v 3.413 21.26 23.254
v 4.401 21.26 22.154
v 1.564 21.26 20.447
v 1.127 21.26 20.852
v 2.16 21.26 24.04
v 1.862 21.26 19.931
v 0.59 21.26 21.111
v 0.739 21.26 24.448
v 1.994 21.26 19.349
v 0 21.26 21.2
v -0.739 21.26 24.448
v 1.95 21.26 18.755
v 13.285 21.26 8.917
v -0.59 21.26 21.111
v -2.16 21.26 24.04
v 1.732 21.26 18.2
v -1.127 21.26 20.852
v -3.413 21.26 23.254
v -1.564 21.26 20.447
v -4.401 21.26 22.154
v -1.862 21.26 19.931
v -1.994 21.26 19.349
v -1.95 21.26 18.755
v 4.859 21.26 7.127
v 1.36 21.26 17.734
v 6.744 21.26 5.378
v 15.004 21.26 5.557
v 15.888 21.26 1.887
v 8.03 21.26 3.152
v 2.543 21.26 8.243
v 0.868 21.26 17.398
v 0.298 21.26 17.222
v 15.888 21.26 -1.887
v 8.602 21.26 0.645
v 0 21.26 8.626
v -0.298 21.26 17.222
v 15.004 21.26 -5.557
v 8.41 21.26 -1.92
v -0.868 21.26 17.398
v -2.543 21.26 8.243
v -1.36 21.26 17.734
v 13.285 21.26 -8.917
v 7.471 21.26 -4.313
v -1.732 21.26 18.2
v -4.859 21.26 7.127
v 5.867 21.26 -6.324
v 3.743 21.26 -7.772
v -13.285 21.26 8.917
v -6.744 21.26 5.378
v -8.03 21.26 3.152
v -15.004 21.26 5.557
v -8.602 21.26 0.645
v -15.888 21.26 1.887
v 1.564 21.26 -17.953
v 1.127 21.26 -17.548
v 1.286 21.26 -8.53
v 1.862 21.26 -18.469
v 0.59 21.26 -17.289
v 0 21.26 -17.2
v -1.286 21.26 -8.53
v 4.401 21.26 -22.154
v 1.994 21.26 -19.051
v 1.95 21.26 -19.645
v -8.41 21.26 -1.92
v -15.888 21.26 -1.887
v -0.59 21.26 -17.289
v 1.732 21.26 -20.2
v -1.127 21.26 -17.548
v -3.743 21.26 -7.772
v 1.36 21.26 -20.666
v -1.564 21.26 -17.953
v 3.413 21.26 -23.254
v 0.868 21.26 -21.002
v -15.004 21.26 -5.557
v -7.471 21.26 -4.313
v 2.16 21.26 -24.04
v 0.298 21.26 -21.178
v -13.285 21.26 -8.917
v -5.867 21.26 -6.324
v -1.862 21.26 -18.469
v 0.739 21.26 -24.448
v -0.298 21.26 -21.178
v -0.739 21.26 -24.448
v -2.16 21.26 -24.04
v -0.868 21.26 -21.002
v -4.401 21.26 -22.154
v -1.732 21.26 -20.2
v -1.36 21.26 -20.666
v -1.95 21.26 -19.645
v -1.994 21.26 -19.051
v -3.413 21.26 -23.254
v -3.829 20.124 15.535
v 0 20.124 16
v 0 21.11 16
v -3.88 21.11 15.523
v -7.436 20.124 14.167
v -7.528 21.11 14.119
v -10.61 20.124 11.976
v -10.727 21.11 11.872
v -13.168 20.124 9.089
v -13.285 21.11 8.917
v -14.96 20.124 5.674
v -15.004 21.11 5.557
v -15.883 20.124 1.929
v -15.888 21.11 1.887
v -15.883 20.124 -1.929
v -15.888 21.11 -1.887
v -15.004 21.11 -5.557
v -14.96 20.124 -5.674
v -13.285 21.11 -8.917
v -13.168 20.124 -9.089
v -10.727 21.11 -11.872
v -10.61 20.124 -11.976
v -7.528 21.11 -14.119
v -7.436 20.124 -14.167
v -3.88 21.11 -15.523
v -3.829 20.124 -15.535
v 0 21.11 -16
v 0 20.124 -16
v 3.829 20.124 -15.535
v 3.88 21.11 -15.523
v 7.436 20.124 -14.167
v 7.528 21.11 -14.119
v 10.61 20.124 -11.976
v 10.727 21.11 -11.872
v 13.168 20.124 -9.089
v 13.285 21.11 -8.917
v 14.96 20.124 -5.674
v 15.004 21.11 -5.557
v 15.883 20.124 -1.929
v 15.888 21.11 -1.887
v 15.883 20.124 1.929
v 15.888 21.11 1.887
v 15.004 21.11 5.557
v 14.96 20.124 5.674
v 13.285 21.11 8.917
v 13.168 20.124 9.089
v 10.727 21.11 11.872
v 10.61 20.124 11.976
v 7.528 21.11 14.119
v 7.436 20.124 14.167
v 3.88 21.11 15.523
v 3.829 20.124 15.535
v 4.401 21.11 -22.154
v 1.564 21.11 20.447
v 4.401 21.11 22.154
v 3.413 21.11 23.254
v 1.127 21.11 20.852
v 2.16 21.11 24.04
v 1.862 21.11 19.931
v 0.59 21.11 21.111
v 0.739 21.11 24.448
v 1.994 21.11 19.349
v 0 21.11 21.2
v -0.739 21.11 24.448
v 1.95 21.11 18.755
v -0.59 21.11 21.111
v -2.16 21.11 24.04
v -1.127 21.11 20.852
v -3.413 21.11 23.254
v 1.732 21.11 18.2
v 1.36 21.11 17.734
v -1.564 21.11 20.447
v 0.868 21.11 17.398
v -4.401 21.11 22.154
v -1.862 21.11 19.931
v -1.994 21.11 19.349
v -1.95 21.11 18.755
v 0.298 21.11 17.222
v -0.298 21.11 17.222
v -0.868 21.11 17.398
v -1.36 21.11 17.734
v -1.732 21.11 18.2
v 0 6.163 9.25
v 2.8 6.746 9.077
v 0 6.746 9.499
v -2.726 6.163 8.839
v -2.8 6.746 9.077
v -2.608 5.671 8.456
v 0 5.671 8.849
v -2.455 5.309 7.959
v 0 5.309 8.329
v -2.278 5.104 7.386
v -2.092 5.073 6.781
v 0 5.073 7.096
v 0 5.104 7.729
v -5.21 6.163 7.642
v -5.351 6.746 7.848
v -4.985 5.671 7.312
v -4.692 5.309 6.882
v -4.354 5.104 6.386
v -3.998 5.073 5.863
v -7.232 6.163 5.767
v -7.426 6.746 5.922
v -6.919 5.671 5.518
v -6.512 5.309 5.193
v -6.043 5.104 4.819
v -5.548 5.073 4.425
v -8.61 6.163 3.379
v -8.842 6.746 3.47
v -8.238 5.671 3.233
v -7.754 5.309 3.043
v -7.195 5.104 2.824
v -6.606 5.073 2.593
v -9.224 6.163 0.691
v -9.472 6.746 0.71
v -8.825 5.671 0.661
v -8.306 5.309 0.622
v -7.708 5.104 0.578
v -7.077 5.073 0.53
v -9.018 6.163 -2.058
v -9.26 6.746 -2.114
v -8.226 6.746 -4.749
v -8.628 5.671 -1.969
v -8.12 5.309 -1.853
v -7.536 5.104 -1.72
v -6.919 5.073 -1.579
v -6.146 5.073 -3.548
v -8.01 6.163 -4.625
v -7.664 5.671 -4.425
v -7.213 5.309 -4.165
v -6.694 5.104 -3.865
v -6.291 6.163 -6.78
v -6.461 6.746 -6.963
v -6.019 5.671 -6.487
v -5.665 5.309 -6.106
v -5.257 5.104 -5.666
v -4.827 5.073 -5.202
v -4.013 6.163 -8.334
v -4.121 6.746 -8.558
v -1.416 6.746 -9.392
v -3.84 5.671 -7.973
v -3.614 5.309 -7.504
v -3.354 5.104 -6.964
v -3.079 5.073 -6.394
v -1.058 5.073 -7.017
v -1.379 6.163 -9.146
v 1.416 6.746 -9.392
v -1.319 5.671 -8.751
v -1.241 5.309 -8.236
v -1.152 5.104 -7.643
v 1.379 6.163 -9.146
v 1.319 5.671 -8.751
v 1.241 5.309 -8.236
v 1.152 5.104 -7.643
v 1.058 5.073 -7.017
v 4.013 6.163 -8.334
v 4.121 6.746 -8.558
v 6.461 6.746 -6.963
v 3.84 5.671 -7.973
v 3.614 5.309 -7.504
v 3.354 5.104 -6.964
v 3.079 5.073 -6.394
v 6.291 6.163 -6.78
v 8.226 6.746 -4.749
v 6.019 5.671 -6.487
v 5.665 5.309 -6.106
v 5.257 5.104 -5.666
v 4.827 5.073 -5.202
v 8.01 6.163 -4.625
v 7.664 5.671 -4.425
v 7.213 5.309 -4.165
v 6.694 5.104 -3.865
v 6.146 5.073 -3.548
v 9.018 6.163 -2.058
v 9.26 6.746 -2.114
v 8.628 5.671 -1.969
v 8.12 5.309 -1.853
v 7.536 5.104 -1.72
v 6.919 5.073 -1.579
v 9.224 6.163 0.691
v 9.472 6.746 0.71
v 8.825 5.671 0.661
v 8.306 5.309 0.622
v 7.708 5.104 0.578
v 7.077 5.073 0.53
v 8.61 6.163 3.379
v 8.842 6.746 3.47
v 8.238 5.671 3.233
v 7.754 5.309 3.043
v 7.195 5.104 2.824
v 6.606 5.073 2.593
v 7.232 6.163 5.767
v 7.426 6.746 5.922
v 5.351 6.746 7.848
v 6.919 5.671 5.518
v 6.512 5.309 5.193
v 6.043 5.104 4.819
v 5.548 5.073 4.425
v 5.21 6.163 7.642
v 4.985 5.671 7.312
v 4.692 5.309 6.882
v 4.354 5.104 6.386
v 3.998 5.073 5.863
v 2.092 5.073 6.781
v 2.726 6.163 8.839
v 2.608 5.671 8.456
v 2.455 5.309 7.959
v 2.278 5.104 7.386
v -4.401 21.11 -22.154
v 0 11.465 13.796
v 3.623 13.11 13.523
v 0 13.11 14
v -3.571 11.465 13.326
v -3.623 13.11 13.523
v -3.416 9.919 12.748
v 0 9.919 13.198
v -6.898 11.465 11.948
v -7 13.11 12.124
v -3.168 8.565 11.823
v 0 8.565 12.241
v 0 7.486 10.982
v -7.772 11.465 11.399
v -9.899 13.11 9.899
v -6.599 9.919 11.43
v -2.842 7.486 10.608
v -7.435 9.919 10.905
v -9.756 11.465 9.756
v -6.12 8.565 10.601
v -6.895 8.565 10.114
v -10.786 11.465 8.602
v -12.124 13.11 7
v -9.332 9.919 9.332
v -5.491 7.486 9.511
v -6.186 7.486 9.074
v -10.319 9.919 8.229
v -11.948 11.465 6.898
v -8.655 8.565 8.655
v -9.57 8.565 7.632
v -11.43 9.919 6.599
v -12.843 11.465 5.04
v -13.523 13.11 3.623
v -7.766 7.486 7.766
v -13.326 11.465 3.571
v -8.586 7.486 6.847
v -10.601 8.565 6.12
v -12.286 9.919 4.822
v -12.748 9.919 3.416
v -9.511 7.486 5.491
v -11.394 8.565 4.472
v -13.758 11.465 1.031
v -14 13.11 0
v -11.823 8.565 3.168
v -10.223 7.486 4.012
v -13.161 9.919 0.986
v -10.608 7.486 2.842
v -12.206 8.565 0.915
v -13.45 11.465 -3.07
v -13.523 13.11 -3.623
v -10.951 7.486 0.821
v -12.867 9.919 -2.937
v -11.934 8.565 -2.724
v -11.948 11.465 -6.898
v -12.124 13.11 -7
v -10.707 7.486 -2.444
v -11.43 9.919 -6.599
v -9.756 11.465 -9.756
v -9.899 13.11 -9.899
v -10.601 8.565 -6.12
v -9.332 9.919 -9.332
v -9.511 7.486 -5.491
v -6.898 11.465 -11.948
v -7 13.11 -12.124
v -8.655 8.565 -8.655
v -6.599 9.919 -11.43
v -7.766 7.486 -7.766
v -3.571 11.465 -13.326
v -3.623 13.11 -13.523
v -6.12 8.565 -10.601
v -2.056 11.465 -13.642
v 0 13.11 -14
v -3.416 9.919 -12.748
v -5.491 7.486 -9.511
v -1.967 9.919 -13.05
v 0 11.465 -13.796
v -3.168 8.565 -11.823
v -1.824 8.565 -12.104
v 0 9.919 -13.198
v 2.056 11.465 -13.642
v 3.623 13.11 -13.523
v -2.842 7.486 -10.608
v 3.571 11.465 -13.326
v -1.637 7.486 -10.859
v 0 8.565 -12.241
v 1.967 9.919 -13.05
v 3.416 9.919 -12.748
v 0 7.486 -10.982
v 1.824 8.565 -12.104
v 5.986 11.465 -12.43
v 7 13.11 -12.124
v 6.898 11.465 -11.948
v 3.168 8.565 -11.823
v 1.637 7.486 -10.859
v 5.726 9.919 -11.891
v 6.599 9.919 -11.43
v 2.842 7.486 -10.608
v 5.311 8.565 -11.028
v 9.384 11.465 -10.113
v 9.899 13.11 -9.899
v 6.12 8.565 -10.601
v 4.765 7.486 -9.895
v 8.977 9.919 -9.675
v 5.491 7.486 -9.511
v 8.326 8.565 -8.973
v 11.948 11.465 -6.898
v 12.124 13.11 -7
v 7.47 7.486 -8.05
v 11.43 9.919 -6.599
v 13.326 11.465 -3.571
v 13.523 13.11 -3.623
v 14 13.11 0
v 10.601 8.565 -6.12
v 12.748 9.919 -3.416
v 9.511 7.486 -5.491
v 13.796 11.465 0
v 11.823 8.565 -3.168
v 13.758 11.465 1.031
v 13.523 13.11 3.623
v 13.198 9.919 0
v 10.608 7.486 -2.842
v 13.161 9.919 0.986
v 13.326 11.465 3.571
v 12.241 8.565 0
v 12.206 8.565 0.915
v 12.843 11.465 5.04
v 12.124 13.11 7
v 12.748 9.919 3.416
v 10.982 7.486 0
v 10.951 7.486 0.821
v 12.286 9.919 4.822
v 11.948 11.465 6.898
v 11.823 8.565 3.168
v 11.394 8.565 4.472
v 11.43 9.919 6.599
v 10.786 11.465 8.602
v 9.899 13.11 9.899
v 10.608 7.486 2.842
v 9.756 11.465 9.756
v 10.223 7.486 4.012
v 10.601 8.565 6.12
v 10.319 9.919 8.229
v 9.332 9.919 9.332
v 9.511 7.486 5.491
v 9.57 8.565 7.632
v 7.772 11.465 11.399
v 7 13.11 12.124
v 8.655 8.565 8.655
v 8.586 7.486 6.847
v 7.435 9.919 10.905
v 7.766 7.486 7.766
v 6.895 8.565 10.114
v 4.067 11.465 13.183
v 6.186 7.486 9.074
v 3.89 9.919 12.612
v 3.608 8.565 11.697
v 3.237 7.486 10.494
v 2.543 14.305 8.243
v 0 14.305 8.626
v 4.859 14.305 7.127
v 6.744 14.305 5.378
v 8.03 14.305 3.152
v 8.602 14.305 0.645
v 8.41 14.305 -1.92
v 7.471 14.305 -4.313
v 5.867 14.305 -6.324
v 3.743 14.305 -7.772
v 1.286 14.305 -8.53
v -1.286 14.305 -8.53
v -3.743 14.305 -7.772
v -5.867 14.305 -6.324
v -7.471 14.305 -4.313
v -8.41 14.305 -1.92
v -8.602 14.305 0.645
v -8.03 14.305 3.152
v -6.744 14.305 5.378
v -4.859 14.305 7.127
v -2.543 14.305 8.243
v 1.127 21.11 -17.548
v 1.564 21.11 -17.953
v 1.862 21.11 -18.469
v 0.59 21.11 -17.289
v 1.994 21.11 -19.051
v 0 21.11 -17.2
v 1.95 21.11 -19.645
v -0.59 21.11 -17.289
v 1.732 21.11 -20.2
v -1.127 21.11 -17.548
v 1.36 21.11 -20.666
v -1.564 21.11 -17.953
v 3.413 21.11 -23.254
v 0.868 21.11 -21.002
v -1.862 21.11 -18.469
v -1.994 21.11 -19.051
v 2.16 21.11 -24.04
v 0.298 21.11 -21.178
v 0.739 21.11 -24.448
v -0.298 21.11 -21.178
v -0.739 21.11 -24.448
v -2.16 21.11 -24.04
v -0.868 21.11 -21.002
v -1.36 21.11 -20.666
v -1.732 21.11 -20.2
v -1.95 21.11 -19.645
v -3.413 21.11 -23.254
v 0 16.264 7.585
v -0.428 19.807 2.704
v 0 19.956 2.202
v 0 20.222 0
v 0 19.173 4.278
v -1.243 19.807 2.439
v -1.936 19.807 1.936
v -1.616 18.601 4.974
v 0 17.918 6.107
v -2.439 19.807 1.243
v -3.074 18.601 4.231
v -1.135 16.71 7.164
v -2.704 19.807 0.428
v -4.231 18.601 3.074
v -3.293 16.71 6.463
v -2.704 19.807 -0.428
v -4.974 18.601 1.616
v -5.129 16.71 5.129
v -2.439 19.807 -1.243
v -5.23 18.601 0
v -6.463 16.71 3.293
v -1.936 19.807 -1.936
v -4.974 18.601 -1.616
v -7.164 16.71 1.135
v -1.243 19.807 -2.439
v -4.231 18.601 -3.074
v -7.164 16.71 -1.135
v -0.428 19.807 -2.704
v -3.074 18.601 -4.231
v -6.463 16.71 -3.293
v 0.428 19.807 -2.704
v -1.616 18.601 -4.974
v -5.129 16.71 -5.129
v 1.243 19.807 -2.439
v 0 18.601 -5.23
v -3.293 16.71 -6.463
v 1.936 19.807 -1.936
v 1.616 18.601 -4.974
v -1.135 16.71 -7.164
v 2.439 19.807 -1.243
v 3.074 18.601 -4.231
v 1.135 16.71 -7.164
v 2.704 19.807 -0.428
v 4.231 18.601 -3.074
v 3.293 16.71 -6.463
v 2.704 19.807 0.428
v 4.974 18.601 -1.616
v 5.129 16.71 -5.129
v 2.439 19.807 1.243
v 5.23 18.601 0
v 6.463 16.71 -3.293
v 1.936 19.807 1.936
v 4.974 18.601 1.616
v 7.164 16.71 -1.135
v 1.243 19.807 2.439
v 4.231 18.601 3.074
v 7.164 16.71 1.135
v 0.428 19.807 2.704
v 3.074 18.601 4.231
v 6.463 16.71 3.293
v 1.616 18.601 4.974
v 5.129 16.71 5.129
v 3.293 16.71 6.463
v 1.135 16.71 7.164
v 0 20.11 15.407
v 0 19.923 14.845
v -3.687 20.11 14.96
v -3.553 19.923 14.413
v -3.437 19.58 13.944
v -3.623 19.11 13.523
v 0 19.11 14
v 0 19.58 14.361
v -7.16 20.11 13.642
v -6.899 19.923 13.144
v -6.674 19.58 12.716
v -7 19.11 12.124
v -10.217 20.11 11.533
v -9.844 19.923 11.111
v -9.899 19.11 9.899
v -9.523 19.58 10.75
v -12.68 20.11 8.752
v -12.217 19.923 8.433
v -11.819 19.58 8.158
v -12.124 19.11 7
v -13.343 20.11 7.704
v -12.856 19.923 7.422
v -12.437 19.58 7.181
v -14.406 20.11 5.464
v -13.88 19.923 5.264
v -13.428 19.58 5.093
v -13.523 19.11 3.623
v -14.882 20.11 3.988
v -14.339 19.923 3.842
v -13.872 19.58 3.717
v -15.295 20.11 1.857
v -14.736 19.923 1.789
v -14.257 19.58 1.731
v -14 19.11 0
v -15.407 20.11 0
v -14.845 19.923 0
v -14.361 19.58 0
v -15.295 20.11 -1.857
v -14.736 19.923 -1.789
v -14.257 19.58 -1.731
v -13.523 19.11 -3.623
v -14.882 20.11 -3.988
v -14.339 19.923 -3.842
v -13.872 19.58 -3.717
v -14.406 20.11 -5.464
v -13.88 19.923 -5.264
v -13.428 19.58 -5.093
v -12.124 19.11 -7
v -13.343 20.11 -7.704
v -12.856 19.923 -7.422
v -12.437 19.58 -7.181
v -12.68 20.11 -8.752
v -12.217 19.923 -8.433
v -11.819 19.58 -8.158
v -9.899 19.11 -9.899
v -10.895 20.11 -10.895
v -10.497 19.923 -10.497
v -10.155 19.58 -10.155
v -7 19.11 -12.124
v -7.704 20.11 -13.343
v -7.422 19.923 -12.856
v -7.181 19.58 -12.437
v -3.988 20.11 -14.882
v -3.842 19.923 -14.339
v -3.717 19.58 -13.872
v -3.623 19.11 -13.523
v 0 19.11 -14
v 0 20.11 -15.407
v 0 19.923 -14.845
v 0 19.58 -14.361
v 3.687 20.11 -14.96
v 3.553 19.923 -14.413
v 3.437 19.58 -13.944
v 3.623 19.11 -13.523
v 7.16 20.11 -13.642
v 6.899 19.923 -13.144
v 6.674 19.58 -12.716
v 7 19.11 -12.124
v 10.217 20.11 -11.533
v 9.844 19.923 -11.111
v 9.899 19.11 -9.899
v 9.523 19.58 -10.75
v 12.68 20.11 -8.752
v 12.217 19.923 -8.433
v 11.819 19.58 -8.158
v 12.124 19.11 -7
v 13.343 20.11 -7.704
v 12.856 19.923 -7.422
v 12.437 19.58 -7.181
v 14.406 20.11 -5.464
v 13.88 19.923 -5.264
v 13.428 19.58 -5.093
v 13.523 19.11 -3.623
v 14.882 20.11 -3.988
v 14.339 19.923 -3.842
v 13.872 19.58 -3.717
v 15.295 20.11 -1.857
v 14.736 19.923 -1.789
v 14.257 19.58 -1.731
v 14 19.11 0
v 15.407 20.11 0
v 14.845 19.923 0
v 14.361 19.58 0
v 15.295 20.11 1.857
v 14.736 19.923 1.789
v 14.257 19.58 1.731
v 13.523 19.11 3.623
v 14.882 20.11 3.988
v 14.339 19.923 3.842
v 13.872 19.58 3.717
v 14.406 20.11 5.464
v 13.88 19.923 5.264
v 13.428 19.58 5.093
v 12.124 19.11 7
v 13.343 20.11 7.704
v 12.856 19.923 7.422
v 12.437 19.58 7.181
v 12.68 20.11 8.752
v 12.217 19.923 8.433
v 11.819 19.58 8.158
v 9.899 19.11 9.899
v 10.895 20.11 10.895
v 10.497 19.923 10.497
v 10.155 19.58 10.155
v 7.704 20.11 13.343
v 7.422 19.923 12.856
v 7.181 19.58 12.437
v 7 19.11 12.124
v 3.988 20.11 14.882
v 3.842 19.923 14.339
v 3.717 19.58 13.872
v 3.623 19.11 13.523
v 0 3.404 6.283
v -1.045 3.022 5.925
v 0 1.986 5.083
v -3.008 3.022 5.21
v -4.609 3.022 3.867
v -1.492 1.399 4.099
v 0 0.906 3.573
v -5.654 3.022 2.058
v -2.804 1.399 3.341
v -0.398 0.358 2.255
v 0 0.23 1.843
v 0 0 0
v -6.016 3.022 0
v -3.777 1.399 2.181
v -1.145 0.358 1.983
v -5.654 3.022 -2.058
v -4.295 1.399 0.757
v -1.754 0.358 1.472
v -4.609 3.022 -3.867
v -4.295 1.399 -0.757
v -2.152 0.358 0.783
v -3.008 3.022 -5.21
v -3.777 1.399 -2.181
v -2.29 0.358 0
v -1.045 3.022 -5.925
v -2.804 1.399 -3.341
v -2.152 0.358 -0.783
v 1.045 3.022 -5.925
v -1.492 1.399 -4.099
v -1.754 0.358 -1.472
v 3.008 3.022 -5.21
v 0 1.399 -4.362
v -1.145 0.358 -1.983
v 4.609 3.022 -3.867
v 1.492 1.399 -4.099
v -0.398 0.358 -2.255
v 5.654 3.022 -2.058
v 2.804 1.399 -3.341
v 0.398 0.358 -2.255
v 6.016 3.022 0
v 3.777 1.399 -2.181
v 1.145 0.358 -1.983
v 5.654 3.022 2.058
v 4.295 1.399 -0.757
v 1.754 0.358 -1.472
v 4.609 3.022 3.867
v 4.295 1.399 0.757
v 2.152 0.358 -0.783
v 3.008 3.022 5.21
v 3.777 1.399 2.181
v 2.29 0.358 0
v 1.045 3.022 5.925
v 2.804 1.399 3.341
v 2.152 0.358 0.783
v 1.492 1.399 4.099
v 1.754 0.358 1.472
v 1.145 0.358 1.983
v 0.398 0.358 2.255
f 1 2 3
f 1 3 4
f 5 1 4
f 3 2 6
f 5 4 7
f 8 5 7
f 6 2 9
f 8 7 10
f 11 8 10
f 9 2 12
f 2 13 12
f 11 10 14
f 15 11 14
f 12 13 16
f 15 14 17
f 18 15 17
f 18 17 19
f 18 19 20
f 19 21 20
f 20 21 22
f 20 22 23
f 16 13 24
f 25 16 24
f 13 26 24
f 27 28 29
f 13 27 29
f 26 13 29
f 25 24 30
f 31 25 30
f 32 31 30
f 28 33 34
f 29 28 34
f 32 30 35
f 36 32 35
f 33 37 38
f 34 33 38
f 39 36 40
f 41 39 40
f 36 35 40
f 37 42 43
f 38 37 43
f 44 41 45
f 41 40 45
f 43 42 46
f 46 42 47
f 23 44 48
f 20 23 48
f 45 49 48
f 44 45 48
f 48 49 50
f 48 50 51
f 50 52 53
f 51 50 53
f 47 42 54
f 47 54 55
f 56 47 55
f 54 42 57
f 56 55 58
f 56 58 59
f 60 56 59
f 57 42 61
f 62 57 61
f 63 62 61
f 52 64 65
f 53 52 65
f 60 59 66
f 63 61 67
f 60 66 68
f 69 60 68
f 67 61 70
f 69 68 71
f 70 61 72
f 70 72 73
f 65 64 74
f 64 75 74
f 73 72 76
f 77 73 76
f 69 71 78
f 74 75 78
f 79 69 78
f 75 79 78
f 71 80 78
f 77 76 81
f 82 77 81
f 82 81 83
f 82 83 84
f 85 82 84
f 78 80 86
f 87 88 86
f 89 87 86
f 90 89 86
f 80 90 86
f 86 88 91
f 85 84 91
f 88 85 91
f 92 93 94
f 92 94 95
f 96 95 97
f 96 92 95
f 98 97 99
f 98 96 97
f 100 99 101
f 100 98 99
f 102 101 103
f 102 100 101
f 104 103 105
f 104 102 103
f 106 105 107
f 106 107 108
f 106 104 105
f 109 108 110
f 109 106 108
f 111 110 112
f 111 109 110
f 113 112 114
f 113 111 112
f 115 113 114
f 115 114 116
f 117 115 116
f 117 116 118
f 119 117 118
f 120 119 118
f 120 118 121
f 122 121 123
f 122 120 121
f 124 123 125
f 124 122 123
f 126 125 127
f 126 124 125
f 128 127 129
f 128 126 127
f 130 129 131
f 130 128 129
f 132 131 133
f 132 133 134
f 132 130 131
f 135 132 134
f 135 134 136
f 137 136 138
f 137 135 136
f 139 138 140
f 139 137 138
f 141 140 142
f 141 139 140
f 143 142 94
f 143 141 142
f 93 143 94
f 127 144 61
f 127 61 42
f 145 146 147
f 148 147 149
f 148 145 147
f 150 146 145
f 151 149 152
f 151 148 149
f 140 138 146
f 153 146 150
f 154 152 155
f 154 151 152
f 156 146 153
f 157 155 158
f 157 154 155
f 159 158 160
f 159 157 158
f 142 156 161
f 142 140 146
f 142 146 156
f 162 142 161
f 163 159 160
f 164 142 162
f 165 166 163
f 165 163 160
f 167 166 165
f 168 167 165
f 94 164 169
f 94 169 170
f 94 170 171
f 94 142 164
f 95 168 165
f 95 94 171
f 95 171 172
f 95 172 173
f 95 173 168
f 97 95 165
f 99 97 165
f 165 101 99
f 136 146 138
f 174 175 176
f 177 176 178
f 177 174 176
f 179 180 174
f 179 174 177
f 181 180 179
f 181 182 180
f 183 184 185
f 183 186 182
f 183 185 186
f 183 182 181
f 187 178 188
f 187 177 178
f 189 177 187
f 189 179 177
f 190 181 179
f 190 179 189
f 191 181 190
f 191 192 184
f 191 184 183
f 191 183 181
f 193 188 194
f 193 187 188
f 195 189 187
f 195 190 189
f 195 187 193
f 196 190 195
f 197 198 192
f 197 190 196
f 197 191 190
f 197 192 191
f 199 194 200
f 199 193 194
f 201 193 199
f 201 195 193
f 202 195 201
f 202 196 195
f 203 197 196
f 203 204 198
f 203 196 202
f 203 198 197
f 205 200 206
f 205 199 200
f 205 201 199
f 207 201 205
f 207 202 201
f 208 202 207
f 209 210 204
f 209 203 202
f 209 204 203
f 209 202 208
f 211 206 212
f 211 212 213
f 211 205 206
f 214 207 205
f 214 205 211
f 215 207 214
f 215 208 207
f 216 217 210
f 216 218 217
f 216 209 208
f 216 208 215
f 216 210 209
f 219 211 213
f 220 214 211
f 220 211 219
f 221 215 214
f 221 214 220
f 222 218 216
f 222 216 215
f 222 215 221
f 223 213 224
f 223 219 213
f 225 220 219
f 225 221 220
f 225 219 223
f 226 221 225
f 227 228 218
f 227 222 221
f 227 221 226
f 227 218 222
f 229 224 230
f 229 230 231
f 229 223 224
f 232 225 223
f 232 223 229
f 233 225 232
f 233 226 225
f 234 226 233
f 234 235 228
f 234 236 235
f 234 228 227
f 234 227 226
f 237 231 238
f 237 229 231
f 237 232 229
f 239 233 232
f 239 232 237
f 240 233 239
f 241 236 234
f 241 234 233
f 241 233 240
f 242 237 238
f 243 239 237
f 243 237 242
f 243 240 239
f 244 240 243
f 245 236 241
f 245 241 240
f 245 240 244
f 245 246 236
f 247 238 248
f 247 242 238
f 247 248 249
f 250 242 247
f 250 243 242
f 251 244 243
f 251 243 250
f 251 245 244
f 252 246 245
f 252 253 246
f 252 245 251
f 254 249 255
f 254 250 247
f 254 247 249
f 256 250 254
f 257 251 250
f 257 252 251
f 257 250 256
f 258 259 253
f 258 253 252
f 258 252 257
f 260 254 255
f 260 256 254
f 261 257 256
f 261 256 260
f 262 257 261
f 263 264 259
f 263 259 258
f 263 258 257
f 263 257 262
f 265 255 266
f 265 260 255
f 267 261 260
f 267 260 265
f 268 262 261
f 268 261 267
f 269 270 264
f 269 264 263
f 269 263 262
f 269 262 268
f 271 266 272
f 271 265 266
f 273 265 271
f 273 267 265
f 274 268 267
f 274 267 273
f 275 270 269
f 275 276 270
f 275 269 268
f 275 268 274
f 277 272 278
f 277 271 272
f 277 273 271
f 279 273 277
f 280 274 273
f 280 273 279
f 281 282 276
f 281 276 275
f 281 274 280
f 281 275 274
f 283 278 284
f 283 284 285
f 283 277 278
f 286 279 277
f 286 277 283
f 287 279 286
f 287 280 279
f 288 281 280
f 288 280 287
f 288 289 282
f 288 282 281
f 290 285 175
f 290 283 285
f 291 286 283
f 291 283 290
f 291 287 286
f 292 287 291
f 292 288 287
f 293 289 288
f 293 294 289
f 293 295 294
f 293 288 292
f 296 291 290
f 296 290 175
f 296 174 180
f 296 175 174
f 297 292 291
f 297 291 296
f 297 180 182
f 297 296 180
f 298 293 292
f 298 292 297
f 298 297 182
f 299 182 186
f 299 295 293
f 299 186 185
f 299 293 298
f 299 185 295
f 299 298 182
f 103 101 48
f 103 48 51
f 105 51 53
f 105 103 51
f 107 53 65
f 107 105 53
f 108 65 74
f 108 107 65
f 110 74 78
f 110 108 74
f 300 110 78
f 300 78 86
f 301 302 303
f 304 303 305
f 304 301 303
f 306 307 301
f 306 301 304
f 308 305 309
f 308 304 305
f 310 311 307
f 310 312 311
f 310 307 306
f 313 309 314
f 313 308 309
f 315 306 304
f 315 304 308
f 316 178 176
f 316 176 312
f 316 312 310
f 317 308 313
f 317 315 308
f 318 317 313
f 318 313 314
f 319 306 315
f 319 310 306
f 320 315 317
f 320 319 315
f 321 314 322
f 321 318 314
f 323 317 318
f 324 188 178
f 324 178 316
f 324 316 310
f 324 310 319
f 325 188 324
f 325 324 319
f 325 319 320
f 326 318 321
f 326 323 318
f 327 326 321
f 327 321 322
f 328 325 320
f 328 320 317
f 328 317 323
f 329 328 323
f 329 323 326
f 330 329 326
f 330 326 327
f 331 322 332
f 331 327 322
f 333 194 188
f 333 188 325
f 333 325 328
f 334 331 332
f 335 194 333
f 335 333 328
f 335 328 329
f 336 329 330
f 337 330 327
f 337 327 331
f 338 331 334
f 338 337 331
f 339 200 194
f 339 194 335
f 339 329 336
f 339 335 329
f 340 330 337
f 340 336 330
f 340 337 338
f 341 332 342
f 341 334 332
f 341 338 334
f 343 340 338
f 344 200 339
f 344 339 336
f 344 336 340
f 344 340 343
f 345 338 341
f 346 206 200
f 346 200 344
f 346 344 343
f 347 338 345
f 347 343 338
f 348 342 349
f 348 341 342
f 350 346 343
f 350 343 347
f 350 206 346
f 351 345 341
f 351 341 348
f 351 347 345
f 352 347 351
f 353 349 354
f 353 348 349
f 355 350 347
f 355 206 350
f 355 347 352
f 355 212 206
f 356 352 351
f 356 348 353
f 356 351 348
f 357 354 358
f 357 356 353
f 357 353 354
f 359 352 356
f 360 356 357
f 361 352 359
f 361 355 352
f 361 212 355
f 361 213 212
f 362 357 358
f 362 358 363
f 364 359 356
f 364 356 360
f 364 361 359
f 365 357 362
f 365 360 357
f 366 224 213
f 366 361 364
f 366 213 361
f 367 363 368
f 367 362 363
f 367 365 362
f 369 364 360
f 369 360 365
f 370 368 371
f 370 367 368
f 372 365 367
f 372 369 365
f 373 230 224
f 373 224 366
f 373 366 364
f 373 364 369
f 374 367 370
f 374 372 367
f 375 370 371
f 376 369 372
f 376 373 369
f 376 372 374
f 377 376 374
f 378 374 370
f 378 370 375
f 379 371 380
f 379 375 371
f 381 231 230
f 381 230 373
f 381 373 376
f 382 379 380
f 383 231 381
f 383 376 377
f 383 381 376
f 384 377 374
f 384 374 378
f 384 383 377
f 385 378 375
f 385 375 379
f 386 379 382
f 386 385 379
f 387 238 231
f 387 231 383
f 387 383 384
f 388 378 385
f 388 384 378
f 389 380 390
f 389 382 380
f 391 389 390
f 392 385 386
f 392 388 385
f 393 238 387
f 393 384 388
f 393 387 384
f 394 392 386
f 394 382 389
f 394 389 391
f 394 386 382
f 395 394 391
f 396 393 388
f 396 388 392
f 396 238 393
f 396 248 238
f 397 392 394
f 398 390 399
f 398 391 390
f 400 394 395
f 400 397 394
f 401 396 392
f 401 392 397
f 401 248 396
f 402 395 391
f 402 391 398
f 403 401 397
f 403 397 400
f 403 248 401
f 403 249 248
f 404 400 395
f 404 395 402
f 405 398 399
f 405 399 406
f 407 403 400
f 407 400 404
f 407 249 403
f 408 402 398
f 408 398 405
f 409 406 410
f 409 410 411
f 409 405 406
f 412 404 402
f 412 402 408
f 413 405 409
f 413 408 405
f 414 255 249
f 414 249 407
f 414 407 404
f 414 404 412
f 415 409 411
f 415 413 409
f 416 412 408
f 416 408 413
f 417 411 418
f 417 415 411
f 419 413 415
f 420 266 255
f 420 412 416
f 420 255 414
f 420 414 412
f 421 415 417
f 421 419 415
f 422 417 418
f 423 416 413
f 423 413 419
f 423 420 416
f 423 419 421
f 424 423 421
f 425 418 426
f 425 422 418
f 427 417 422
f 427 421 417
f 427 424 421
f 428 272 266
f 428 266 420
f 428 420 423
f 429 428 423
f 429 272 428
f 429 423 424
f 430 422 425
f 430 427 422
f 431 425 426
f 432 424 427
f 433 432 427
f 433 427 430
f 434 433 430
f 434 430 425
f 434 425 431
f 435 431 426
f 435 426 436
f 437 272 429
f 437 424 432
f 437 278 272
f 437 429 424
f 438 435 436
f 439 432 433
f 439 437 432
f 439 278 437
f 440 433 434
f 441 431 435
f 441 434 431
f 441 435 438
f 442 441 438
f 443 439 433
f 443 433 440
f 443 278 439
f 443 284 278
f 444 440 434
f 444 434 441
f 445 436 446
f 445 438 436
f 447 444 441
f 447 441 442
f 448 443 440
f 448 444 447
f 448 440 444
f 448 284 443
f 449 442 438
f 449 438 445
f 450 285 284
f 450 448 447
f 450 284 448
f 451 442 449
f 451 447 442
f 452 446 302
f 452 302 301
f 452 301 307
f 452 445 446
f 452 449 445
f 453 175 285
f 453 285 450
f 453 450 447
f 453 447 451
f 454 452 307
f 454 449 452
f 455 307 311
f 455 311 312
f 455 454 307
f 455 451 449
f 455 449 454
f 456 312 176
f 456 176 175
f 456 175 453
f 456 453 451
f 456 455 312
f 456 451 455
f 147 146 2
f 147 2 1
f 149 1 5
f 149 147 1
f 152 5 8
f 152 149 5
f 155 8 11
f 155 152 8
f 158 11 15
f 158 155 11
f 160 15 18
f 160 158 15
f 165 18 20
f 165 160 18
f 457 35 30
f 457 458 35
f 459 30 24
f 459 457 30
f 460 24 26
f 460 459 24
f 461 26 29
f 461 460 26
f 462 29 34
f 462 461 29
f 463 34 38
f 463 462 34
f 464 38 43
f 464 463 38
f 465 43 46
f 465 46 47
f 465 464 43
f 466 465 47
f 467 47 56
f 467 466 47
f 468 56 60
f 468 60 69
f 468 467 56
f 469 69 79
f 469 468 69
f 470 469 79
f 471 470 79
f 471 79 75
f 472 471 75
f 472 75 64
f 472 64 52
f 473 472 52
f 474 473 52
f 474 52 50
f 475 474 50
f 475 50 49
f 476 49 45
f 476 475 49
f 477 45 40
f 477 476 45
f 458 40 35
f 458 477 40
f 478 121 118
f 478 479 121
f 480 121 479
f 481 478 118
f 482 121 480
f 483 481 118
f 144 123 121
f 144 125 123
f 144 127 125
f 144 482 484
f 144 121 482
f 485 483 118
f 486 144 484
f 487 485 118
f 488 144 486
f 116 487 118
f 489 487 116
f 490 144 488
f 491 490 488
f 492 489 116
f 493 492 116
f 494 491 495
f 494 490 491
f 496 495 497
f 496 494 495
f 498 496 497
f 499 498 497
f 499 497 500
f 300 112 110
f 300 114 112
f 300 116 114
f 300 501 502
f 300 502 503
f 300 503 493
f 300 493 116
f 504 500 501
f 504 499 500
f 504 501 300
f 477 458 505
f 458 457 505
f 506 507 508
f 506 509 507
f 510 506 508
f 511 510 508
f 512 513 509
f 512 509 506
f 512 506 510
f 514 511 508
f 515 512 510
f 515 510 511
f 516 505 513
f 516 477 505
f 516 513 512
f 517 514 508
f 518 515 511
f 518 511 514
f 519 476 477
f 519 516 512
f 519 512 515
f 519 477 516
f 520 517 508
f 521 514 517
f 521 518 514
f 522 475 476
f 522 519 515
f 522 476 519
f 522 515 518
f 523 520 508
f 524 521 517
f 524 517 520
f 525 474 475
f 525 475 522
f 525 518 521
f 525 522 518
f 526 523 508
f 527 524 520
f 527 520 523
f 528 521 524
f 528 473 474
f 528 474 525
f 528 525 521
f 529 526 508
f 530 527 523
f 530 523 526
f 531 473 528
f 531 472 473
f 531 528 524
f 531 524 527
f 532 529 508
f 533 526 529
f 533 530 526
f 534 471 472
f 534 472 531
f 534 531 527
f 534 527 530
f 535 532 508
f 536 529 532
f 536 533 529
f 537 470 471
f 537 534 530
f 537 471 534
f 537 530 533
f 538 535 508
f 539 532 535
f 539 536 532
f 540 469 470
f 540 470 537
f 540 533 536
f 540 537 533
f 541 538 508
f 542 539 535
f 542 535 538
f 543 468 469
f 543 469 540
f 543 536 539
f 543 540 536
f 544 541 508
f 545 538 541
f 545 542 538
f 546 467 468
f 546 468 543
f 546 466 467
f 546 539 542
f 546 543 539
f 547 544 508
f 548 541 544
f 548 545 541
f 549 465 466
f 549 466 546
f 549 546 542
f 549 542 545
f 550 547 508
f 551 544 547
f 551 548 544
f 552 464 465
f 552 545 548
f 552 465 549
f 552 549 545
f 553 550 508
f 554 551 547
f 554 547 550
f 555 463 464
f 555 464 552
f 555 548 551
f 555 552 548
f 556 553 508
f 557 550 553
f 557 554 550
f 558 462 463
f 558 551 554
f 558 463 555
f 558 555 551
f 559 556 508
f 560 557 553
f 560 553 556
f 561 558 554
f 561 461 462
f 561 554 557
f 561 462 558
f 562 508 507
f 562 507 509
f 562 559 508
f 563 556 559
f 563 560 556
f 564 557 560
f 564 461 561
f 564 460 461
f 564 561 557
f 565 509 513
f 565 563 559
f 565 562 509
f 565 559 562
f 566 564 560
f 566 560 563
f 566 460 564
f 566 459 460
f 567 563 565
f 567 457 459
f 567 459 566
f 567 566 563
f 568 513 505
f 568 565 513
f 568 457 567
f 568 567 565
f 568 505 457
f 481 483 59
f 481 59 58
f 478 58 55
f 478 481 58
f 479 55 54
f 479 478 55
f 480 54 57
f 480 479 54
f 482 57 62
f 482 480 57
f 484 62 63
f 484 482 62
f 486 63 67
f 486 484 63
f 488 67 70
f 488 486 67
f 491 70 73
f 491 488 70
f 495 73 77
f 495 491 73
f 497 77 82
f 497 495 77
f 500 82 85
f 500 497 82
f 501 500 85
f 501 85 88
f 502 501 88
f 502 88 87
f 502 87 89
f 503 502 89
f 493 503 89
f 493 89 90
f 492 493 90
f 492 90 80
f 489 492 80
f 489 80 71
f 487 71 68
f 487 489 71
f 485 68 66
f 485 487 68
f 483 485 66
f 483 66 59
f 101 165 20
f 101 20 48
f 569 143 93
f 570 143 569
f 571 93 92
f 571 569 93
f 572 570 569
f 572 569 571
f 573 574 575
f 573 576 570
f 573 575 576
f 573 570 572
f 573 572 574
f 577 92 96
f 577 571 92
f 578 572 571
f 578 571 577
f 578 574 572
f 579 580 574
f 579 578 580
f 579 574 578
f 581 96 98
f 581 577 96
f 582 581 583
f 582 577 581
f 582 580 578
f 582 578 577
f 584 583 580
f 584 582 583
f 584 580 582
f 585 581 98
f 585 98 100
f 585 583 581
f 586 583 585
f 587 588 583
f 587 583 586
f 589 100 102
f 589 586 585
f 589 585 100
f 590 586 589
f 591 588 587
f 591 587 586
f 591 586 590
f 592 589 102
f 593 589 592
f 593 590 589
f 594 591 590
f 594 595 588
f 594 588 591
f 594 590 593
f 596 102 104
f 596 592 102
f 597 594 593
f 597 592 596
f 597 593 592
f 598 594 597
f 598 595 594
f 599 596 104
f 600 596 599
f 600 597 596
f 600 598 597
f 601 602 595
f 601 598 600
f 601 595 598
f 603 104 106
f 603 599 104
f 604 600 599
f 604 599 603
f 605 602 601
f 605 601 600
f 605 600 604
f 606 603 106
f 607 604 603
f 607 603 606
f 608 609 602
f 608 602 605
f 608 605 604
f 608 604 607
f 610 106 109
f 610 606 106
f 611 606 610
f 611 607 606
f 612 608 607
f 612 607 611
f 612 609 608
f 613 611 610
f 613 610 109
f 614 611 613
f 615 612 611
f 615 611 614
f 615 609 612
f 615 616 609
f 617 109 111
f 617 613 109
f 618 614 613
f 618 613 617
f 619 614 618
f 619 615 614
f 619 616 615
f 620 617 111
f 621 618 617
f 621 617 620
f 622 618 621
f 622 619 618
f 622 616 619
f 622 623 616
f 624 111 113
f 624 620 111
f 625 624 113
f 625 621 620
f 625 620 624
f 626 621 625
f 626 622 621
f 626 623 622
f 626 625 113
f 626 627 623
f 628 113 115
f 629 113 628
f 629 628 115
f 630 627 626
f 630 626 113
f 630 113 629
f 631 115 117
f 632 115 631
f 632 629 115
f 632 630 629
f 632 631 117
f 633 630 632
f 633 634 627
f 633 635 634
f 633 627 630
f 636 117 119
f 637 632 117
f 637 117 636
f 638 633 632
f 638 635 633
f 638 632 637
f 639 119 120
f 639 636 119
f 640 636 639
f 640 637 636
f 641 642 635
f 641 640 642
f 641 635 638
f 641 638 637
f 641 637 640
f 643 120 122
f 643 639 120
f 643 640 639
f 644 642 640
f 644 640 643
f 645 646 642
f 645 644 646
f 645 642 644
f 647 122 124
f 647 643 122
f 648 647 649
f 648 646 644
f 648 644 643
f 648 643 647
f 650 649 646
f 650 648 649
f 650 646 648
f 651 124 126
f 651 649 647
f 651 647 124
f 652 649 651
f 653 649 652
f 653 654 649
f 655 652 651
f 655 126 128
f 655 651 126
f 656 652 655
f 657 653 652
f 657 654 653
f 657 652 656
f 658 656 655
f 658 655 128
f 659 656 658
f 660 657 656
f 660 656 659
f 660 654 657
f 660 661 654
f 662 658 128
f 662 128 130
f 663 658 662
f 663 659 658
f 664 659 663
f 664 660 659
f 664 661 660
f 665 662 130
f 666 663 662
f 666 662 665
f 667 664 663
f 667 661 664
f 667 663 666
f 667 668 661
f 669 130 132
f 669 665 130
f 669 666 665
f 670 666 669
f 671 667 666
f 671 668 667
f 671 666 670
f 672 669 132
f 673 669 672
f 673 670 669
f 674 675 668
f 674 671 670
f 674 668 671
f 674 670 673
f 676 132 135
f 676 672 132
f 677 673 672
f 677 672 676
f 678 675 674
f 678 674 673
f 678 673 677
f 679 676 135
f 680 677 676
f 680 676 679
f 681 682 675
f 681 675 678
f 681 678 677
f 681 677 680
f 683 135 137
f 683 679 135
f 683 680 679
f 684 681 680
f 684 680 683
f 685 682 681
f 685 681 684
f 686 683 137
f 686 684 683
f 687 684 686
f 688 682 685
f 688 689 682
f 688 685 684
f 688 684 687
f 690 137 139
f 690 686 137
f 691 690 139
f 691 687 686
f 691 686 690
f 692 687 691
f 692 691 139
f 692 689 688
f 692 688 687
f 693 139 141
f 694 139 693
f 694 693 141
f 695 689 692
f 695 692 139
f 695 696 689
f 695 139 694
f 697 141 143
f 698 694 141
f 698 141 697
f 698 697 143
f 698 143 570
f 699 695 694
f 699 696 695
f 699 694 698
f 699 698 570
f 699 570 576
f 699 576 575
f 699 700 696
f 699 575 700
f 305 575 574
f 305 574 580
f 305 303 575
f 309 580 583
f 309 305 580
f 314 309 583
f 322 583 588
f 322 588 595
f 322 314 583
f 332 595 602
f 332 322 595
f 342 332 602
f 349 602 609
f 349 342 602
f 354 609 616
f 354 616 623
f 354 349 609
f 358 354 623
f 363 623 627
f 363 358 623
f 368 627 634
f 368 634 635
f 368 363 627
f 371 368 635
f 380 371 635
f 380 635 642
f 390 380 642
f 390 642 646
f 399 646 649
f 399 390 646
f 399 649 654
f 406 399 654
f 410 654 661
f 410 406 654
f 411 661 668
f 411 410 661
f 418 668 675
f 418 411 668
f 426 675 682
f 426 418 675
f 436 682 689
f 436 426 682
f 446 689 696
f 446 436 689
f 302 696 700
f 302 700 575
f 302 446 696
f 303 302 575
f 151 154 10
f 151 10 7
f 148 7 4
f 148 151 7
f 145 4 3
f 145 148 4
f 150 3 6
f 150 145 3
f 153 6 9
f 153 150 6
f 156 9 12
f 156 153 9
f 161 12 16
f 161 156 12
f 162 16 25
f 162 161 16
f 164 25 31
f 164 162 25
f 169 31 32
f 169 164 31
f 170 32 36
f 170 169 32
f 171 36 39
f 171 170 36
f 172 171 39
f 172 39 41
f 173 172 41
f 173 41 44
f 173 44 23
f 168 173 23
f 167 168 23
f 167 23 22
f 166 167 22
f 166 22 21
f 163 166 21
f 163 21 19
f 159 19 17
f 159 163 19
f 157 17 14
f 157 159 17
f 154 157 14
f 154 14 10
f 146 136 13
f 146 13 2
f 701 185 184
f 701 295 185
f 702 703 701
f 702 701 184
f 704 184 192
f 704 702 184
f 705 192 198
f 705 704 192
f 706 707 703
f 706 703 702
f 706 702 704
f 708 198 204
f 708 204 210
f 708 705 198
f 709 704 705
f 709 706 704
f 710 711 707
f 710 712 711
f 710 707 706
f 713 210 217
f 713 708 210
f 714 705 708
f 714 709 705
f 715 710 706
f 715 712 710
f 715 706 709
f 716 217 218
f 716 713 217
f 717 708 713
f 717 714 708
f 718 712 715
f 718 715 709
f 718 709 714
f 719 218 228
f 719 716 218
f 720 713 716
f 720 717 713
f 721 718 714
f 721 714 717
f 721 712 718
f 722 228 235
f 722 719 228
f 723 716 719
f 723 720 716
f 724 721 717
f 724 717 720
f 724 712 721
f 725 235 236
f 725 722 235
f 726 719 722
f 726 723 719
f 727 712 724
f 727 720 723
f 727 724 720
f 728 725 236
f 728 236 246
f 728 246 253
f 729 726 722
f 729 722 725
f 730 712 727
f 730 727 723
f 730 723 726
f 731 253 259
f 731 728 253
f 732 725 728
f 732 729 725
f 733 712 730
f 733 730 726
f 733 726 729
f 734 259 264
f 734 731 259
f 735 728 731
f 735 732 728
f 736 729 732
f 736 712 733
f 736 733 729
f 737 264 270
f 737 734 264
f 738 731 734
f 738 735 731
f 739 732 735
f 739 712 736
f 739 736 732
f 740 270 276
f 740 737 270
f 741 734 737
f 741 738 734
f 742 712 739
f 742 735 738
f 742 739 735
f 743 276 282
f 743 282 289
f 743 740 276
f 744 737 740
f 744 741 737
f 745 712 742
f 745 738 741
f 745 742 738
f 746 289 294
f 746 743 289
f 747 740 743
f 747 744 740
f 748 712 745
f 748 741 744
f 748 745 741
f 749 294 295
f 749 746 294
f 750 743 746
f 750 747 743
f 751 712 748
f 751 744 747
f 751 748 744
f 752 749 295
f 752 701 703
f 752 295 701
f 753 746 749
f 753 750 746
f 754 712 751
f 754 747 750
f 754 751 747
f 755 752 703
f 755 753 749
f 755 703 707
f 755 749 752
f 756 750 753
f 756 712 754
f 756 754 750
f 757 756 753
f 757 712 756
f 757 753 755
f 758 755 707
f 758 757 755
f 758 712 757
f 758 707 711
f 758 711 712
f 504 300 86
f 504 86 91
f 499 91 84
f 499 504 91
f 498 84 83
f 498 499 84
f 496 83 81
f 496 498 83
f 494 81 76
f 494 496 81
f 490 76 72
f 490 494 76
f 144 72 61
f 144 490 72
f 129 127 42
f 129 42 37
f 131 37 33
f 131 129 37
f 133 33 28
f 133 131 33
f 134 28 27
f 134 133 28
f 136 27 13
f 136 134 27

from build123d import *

# Parameters (mm, degrees)
SKETCH2_R           = 8.626283366
SKETCH2_R_2         = 2
BOSS_EXTRUDE2_DEPTH = 0.15


with BuildPart() as part:
    # Sketch1 → Revolve1 (revolve)
    with BuildSketch(Plane.XY, mode=Mode.PRIVATE) as revolve1_sk:
        with BuildLine():
            Line((16, 21.11), (16, 20.123658445))
            ThreePointArc((16, 20.123658445), (14.844631277, 19.923379665), (14, 19.11))
            Line((14, 19.11), (14, 13.11))
            ThreePointArc((14, 13.11), (12.760912849, 9.212301981), (9.498573932, 6.745617646))
            ThreePointArc((9.498573932, 6.745617646), (8.602056269, 5.471944767), (7.096455966, 5.073003354))
            ThreePointArc((7.096455966, 5.073003354), (4.361623846, 1.398669209), (0, 0))
            Line((0, 0), (0, 20.221919192))
            ThreePointArc((0, 20.221919192), (5.230275248, 18.600523967), (8.626283366, 14.304964573))
            Line((8.626283366, 14.304964573), (8.626283366, 21.11))
            Line((8.626283366, 21.11), (16, 21.11))
        make_face()
    revolve(revolve1_sk.sketch.rotate(Axis((0, 20.221919192, 0), (0, -1, 0)), 90), axis=Axis((0, 20.221919192, 0), (0, -1, 0)))

    # Sketch2 → Boss-Extrude2 (add)
    with BuildSketch(Plane(origin=(0, 21.11, 0), x_dir=(1, 0, 0), z_dir=(0, 1, 0))):
        with BuildLine():
            Line((-4.400679072, -22.153645833), (-13.285068895, -8.916666667))
            ThreePointArc((-13.285068895, -8.916666667), (-16, 0), (-13.285068895, 8.916666667))
            Line((-13.285068895, 8.916666667), (-4.400679072, 22.153645833))
            ThreePointArc((-4.400679072, 22.153645833), (0, 24.5), (4.400679072, 22.153645833))
            Line((4.400679072, 22.153645833), (13.285068895, 8.916666667))
            ThreePointArc((13.285068895, 8.916666667), (16, 0), (13.285068895, -8.916666667))
            Line((13.285068895, -8.916666667), (4.400679072, -22.153645833))
            ThreePointArc((4.400679072, -22.153645833), (0, -24.5), (-4.400679072, -22.153645833))
        make_face()
        with Locations(Location((0, 0, 0), (0, 0, 270))):
            Circle(SKETCH2_R, mode=Mode.SUBTRACT)
        with Locations(Location((0, -19.2, 0), (0, 0, 270))):
            Circle(SKETCH2_R_2, mode=Mode.SUBTRACT)
        with Locations(Location((0, 19.2, 0), (0, 0, 270))):
            Circle(SKETCH2_R_2, mode=Mode.SUBTRACT)
    extrude(amount=BOSS_EXTRUDE2_DEPTH)


solid = part.part
